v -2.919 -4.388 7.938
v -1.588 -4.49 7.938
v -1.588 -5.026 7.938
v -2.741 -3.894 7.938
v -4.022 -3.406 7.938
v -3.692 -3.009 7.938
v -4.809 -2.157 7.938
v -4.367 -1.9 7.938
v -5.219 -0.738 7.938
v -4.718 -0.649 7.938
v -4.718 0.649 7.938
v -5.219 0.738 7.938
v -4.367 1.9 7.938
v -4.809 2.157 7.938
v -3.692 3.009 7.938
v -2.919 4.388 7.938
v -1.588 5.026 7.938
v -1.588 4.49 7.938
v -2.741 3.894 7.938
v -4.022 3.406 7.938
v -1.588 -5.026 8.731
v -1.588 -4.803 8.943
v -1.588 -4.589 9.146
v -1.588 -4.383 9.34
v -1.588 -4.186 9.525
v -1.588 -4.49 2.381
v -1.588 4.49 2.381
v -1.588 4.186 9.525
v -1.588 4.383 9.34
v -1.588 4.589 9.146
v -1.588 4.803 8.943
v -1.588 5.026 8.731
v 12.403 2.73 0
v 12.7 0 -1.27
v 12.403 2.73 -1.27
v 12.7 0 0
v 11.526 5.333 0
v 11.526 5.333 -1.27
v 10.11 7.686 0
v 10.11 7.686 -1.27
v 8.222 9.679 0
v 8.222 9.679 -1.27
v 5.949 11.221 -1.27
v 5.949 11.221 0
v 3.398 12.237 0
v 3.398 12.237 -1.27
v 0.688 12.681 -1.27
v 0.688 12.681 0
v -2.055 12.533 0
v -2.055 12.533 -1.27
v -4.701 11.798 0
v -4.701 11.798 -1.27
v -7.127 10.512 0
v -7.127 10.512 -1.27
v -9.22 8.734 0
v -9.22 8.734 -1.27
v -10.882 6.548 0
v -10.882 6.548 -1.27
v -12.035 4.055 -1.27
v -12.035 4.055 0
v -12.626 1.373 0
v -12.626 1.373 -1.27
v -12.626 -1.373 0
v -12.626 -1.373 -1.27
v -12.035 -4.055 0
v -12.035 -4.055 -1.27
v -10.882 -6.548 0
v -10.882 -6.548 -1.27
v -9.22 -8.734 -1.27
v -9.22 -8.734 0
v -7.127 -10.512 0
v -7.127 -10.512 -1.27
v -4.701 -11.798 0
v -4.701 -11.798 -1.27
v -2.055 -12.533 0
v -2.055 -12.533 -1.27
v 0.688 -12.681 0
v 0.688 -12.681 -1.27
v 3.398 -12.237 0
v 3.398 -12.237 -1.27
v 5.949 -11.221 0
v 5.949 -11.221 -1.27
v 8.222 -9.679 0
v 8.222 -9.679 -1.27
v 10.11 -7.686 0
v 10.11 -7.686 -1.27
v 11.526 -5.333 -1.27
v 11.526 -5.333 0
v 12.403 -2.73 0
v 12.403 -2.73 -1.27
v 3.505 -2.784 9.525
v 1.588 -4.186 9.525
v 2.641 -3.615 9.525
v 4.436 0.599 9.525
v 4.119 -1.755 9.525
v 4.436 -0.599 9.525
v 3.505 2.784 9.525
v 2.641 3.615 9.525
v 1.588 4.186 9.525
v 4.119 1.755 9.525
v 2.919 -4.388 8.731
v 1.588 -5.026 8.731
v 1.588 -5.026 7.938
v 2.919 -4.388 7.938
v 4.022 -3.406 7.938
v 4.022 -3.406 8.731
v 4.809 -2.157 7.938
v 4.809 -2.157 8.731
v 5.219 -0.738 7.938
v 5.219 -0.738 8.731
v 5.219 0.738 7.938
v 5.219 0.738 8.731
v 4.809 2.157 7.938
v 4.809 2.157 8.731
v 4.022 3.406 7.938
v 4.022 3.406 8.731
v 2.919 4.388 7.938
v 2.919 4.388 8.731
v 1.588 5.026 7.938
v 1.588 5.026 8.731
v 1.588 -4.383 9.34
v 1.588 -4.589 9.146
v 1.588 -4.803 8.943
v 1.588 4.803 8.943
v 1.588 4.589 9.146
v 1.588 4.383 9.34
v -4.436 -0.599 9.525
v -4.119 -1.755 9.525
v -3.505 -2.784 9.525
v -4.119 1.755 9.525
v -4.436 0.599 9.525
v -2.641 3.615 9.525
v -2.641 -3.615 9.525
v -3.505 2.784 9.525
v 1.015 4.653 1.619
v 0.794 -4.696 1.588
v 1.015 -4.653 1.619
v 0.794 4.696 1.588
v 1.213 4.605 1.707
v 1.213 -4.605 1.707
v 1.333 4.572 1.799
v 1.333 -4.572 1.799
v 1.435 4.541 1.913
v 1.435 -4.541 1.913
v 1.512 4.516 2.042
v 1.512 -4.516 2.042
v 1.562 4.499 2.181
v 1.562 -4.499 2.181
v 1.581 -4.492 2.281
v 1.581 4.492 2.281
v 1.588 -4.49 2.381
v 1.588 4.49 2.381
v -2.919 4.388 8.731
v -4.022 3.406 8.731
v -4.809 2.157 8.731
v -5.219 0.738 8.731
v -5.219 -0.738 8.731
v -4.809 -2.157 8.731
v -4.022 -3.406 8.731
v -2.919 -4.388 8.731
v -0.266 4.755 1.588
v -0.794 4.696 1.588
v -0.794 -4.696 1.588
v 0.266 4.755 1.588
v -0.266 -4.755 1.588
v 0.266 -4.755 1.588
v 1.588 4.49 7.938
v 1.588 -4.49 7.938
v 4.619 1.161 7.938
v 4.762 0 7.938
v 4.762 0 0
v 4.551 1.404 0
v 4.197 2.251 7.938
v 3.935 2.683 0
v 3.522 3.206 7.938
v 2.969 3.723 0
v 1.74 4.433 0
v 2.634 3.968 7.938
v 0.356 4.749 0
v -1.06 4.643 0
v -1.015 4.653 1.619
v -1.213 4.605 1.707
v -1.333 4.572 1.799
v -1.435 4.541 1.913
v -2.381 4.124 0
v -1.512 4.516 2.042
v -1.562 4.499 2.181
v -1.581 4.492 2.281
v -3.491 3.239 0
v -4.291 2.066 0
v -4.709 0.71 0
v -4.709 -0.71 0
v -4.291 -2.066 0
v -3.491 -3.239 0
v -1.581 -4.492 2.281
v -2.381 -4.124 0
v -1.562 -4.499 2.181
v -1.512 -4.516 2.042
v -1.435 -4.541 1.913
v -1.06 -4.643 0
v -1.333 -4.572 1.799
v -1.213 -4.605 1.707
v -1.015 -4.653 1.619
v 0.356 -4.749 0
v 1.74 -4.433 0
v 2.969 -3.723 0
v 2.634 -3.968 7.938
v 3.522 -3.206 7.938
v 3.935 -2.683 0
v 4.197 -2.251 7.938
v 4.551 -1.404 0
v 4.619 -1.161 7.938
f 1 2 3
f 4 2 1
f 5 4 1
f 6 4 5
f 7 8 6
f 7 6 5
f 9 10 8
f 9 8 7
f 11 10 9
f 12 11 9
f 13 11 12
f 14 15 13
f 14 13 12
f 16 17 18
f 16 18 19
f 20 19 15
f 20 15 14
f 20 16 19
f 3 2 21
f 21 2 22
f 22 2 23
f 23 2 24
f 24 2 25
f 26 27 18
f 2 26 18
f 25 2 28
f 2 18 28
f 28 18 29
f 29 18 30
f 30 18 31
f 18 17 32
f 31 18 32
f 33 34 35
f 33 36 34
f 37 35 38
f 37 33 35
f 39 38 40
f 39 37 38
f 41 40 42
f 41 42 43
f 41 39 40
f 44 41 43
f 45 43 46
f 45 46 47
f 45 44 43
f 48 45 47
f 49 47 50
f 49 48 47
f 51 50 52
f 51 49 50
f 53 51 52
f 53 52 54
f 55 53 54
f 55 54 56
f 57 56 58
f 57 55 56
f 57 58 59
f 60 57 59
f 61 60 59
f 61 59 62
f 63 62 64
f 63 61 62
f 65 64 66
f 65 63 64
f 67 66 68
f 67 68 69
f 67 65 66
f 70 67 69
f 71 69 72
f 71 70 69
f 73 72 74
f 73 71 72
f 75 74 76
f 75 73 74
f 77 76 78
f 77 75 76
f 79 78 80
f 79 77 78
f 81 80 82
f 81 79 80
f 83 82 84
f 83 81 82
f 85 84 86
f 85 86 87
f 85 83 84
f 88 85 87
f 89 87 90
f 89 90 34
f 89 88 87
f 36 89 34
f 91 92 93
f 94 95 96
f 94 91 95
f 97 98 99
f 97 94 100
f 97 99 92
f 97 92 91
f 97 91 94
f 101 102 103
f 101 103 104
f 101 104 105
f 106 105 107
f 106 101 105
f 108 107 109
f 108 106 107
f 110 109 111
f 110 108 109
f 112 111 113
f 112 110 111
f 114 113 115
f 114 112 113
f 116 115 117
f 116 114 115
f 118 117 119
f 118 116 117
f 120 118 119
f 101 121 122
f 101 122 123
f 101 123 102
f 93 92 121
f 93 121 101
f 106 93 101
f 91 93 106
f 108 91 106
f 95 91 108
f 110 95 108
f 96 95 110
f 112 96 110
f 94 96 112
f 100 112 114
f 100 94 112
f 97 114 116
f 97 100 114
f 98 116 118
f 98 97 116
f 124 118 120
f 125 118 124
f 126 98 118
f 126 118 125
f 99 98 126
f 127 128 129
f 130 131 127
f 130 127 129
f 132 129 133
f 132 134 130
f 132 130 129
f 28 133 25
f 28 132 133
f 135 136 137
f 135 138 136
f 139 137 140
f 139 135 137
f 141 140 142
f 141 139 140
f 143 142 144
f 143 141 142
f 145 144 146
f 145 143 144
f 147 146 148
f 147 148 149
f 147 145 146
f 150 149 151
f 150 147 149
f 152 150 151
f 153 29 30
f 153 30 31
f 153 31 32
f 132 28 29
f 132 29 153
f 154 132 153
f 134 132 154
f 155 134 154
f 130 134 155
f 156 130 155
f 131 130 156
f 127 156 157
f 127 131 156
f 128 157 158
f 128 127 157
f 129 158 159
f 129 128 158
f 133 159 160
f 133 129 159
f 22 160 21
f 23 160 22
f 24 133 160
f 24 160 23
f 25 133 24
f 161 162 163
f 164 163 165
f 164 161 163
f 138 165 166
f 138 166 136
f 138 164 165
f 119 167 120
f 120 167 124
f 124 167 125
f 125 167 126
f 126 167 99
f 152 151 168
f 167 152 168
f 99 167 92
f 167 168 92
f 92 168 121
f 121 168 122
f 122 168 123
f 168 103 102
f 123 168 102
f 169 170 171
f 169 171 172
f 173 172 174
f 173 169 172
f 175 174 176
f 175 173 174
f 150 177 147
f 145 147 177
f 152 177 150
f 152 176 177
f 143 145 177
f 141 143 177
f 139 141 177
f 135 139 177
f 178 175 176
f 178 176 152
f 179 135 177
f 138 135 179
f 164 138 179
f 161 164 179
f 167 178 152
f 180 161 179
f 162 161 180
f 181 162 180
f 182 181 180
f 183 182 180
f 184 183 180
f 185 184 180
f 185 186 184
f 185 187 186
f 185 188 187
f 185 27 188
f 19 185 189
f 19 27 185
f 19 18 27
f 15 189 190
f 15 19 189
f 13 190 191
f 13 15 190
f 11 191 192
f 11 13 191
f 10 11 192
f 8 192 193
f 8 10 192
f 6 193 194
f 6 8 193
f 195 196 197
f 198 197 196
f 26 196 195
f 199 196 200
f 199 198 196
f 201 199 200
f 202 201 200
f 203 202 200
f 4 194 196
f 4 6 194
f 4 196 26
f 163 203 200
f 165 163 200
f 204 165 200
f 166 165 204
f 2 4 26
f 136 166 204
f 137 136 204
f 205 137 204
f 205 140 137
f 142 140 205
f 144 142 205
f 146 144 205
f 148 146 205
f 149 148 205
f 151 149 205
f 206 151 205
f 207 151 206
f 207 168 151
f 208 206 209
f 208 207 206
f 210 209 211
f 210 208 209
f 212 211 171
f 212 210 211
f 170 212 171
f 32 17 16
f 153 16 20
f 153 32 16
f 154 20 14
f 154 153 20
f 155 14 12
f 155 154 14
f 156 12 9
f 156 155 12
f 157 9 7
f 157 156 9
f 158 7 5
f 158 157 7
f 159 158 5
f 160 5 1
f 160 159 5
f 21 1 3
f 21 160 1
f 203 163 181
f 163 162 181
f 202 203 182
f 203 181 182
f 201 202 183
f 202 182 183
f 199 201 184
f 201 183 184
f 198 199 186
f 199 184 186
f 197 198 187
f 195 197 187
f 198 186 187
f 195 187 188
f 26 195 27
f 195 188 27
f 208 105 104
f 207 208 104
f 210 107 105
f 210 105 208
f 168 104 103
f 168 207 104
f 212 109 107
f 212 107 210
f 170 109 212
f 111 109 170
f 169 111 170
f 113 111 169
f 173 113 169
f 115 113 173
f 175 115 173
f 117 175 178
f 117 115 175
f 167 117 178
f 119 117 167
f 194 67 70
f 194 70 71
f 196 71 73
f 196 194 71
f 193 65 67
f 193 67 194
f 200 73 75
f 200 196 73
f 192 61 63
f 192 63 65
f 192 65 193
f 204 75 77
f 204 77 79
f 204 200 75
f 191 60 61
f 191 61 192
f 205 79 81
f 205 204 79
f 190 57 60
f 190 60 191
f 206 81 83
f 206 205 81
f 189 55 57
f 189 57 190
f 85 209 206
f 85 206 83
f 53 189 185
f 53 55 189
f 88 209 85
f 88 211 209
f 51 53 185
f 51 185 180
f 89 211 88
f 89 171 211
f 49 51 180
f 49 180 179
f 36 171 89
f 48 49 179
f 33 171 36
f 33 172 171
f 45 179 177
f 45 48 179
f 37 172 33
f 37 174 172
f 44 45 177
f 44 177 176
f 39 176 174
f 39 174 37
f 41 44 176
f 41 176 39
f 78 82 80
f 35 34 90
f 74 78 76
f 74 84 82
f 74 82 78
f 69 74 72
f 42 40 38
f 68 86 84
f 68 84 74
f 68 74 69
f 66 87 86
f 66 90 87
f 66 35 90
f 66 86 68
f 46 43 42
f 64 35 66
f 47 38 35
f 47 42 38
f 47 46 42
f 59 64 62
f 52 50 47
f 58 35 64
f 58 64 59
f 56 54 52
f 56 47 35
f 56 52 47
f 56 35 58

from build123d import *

# Parameters (mm, degrees)
F2_SIZE       = 0.79375
F3_W          = 3.175002
F3_H          = 7.9375
F4_DEPTH      = 12.701
F4_DEPTH_BACK = 12.701
F5_R          = 0.79375


with BuildPart() as f1:
    # F0 (on Front) → F1 (revolve)
    with BuildSketch(Plane.XZ):
        Polygon((12.7, 0), (4.7625, 0), (4.7625, 7.9375), (5.2705, 7.9375), (5.2705, 9.525), (0, 9.525), (0, 7.9375), (0, 0), (0, -1.27), (12.7, -1.27), align=None)
    revolve(axis=Axis((0, 0, 3.96875), (0, 0, 1)))

    # F2
    f2_edges = [f1.edges().sort_by_distance(p)[0] for p in [
        (-5.2705, 0, 9.525),
    ]]
    chamfer(f2_edges, length=F2_SIZE)

    # F3 (on Front) → F4 (cut, two sides)
    with BuildSketch(Plane.XZ) as f4_sk:
        with Locations((0, 5.55625)):
            Rectangle(F3_W, F3_H)
    extrude(amount=F4_DEPTH, mode=Mode.SUBTRACT)
    extrude(f4_sk.sketch, amount=-F4_DEPTH_BACK, mode=Mode.SUBTRACT)

    # F5
    f5_edges = [f1.edges().sort_by_distance(p)[0] for p in [
        (1.587501, 0, 1.5875),
        (-1.587501, 0, 1.5875),
    ]]
    fillet(f5_edges, radius=F5_R)


solid = f1.part
